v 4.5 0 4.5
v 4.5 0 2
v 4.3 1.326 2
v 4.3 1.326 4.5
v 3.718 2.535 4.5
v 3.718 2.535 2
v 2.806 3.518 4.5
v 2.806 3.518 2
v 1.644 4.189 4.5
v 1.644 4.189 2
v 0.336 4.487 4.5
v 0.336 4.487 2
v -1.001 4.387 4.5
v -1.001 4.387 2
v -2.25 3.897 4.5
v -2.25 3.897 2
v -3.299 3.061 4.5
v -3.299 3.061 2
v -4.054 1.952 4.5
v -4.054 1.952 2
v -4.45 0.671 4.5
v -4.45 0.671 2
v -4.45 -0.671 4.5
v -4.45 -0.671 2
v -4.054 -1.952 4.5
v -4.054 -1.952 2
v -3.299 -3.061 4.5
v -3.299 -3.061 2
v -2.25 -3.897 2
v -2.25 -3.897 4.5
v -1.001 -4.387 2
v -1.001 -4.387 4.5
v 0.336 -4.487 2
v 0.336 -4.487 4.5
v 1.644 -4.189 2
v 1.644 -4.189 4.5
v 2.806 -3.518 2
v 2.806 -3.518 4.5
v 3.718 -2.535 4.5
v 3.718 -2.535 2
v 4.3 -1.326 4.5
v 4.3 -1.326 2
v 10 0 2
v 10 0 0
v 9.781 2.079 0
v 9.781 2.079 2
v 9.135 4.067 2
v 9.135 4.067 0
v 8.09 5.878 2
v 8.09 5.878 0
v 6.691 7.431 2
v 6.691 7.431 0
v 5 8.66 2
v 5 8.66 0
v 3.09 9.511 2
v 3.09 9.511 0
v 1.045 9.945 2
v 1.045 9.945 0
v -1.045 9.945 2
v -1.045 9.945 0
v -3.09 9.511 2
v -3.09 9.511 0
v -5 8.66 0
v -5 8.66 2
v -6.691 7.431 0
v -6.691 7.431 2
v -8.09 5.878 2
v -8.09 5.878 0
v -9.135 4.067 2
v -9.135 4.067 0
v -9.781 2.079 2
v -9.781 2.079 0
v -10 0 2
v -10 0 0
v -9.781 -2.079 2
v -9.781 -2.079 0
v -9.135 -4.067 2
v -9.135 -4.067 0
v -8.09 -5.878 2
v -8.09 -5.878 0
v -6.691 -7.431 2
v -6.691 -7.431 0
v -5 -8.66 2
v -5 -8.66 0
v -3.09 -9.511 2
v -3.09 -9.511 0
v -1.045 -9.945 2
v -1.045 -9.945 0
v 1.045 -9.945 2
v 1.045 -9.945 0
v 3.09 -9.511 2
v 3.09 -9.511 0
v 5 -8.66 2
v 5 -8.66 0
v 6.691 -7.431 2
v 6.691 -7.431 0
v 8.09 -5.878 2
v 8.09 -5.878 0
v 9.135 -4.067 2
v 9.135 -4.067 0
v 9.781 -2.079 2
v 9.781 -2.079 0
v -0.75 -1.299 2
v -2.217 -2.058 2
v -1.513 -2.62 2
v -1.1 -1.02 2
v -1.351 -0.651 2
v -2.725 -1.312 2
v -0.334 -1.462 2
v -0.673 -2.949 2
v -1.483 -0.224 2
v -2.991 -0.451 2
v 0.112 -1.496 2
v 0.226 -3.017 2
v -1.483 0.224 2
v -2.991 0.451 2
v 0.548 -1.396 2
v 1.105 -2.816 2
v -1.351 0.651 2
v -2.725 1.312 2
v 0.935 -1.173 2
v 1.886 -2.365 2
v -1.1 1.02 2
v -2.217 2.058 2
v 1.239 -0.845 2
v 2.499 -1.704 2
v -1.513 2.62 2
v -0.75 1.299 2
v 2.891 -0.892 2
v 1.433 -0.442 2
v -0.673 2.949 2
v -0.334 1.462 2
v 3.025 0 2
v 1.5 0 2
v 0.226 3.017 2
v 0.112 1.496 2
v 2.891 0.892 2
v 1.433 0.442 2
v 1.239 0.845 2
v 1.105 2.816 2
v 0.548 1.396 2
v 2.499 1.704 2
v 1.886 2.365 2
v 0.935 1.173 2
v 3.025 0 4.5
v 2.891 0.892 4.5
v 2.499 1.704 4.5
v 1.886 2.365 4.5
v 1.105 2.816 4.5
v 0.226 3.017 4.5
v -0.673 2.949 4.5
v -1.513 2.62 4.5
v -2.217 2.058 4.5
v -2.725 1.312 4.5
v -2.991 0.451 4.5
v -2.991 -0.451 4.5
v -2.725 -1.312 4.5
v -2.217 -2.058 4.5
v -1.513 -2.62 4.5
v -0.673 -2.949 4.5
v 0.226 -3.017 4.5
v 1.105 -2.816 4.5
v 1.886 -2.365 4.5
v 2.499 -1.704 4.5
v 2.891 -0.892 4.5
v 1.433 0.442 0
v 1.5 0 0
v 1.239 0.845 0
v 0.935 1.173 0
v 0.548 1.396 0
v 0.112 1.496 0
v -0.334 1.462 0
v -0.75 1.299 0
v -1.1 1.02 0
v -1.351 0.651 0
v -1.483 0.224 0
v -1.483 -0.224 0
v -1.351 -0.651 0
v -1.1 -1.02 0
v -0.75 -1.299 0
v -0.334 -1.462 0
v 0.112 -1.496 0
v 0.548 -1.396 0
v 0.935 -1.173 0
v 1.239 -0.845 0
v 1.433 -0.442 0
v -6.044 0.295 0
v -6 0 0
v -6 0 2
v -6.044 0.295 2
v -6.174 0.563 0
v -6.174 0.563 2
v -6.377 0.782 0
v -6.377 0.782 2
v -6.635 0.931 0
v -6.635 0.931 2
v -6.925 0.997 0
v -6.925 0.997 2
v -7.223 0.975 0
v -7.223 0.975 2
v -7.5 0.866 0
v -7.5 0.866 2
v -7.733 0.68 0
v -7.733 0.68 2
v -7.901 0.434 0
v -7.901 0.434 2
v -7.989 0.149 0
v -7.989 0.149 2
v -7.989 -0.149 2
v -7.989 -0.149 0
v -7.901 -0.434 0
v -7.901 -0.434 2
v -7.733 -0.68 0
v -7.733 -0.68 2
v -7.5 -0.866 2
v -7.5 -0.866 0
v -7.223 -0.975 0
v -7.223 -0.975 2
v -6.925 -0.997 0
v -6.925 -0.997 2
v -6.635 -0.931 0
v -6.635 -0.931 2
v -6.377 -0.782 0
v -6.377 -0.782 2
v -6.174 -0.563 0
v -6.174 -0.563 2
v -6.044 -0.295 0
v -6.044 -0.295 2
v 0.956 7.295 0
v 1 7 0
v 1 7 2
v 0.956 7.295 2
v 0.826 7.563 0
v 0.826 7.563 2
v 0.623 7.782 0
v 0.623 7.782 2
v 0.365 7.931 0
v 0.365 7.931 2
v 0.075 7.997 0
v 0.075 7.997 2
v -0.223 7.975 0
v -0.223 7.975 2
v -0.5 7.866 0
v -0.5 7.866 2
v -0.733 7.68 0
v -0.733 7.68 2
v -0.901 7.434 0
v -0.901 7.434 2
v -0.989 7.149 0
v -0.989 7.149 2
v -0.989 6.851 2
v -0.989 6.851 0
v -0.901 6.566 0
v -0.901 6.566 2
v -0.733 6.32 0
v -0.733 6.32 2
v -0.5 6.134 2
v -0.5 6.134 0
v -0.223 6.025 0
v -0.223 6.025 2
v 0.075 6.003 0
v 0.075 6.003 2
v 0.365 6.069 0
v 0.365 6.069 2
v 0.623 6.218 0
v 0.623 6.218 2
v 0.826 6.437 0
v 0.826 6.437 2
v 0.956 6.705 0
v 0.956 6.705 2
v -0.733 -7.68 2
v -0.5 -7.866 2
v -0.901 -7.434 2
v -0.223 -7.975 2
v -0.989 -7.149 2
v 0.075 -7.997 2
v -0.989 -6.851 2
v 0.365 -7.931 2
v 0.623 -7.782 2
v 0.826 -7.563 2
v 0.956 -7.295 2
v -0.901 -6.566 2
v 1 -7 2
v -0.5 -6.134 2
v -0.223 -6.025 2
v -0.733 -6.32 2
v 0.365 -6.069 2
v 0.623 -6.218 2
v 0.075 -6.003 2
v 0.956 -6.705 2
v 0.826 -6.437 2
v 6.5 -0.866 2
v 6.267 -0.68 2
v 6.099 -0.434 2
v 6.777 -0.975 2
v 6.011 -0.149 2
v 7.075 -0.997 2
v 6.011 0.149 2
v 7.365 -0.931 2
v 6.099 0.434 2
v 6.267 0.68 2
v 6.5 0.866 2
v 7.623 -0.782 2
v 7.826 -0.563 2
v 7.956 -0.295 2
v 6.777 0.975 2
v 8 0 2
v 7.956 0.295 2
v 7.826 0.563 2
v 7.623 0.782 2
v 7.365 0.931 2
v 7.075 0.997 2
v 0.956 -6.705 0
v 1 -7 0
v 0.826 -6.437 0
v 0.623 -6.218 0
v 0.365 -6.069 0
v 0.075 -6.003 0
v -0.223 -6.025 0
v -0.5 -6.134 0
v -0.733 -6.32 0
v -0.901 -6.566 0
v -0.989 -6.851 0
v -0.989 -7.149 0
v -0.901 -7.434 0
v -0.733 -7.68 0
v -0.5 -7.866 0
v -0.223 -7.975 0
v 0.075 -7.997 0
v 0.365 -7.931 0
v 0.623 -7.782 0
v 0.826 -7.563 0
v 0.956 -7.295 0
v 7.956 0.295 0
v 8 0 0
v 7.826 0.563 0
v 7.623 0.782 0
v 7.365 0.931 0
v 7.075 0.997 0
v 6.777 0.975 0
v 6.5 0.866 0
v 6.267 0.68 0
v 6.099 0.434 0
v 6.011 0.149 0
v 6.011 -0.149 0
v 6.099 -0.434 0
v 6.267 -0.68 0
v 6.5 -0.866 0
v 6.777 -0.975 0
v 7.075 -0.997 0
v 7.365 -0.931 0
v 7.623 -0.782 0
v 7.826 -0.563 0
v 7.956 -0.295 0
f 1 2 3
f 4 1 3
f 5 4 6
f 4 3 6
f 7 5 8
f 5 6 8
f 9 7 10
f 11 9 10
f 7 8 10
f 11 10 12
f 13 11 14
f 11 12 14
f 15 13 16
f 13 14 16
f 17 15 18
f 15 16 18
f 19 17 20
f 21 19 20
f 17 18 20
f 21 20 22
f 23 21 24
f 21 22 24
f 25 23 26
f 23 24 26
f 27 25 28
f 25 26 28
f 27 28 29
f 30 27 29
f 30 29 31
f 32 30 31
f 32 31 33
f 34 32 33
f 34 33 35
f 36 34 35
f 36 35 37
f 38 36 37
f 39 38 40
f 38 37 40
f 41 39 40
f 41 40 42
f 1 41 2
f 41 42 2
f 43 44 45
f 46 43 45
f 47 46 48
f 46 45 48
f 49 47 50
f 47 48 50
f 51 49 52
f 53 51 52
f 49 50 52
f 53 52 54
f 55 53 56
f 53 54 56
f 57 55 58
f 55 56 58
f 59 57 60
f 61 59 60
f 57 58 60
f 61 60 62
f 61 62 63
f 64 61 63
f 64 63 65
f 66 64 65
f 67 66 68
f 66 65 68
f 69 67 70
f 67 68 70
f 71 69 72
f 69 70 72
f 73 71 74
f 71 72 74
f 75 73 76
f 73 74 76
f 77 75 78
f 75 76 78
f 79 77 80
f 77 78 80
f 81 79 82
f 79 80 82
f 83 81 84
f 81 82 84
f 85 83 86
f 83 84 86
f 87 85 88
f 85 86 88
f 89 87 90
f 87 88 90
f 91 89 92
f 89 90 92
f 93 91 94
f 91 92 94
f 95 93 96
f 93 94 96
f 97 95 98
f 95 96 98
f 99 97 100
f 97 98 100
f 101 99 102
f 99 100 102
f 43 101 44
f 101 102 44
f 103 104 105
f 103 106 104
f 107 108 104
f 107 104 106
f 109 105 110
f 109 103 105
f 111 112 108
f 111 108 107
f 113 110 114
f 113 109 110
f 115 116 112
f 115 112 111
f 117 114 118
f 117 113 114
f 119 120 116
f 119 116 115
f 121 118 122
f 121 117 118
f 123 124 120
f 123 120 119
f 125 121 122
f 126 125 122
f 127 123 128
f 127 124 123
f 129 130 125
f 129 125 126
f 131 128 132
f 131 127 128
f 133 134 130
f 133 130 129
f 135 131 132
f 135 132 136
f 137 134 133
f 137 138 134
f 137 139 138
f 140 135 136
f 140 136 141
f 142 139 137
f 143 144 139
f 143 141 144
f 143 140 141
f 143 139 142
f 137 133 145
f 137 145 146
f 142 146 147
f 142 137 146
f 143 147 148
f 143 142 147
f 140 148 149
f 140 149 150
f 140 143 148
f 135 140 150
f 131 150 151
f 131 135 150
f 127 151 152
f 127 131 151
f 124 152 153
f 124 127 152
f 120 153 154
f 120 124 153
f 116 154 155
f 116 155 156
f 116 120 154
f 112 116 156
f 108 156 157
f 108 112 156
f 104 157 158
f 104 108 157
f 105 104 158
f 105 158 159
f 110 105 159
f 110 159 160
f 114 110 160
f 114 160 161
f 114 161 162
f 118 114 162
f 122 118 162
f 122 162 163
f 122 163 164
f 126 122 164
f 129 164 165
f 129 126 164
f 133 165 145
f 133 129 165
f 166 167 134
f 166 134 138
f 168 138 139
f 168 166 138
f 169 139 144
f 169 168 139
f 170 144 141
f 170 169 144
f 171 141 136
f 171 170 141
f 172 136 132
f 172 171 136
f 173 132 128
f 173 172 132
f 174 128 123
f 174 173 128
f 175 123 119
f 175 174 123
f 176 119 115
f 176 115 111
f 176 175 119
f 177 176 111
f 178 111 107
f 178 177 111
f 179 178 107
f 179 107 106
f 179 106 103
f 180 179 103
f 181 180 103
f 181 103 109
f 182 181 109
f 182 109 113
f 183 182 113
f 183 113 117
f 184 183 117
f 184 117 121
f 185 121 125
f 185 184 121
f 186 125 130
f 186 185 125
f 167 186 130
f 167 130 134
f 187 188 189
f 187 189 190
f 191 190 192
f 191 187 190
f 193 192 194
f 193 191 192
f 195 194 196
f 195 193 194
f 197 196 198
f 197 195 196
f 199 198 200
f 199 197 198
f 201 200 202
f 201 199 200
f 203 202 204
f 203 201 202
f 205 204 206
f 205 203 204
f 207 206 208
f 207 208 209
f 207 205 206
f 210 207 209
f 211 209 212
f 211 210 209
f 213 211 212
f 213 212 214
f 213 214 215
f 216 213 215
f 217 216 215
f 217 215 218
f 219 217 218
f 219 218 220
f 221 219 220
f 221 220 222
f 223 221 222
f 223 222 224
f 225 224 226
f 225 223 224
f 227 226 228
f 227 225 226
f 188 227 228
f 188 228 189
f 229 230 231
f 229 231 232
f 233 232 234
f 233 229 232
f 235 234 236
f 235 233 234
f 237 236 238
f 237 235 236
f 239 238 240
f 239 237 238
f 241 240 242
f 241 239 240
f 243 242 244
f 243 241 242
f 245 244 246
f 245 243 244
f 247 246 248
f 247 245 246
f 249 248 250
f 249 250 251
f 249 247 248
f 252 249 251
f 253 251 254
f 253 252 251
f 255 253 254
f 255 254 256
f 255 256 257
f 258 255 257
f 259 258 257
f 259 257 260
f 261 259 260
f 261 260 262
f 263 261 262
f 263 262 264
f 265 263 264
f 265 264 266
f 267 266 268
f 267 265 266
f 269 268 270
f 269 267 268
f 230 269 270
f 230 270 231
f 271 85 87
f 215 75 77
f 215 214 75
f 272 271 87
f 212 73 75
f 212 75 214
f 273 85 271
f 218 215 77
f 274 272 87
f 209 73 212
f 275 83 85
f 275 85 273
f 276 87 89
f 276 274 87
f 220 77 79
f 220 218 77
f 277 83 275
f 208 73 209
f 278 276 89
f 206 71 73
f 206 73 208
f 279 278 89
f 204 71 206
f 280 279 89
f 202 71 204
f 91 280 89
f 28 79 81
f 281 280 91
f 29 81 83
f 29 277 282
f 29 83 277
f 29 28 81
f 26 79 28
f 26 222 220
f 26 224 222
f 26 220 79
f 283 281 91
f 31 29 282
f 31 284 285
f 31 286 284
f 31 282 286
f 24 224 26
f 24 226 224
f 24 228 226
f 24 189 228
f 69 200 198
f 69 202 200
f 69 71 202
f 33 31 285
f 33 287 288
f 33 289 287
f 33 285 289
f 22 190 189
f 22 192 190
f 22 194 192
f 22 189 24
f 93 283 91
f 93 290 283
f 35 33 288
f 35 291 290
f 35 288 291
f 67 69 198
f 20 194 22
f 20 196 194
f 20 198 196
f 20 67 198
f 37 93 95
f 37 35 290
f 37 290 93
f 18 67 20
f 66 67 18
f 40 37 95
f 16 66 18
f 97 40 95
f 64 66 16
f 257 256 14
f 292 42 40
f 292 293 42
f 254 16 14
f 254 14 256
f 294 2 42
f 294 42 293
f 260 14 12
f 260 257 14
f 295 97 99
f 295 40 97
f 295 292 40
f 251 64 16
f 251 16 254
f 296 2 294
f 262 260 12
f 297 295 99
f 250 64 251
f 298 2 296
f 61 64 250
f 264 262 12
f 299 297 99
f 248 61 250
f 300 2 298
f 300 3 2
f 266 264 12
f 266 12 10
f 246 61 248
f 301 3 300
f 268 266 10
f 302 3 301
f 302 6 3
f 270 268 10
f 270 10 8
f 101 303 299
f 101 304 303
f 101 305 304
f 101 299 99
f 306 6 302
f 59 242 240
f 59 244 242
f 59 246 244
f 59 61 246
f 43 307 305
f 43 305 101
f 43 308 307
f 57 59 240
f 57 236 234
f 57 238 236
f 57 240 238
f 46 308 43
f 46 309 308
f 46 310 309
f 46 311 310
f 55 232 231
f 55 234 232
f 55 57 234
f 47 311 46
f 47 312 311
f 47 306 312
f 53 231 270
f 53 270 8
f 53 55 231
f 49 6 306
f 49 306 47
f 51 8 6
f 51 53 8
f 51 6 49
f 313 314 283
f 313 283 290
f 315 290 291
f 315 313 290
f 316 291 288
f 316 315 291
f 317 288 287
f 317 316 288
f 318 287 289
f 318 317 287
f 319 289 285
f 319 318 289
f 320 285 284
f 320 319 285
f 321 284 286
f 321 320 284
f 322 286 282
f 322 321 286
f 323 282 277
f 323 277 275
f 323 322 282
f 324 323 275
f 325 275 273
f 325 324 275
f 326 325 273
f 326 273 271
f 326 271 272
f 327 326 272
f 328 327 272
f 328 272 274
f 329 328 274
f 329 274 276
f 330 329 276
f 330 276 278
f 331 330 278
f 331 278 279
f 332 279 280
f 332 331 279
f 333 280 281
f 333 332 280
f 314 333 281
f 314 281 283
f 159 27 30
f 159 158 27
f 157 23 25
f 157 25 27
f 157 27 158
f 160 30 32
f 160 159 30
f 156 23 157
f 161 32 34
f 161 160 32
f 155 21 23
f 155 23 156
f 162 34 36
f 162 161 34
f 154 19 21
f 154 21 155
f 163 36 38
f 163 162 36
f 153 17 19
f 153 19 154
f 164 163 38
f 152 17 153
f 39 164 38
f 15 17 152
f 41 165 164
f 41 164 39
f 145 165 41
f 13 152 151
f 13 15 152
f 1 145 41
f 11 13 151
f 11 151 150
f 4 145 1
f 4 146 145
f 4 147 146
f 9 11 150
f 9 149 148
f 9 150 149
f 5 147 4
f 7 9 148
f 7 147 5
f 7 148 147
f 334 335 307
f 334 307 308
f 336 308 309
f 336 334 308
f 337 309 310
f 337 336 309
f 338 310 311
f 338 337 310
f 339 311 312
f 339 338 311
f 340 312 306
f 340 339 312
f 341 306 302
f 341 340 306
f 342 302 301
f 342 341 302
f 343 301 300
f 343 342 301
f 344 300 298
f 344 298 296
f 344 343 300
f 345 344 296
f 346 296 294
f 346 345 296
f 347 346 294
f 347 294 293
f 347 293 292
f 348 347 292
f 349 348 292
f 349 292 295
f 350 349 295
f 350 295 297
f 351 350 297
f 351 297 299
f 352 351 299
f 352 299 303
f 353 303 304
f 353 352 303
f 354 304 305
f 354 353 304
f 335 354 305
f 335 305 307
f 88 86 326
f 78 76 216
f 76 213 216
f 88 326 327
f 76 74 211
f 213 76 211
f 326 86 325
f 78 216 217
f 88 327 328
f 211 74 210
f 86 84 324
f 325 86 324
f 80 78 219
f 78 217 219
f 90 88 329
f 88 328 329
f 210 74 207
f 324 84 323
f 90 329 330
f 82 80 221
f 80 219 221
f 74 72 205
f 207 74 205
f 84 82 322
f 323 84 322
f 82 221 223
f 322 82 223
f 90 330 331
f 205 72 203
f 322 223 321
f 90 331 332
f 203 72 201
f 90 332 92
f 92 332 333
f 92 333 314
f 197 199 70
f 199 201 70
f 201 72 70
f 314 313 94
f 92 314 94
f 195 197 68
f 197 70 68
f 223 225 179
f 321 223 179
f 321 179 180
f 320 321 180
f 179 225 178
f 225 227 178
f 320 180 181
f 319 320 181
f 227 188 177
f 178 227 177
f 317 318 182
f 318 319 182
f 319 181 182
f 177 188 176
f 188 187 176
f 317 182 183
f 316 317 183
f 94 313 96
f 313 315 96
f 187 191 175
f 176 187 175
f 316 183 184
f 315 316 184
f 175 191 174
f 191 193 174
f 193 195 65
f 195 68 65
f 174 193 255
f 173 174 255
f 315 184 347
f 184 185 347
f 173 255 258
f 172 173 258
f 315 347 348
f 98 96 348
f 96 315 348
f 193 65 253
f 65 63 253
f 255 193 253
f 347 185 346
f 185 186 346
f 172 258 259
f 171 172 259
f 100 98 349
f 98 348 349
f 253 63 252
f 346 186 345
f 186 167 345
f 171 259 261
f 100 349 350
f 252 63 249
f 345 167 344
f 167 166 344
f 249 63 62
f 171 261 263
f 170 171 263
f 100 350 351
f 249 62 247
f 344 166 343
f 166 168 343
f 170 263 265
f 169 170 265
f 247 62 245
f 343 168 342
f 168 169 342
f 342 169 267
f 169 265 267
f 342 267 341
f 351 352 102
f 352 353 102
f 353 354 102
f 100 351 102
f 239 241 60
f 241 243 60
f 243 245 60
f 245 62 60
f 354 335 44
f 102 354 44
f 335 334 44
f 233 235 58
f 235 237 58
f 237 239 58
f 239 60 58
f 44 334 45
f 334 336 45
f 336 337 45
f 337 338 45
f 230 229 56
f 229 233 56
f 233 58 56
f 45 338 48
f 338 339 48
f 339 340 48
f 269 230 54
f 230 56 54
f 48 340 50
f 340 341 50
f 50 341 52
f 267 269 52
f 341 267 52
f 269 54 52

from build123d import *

# Parameters (mm, degrees)
SKETCH1_R           = 10
SKETCH1_R_2         = 1
SKETCH1_R_3         = 1.5
BOSS_EXTRUDE1_DEPTH = 2
SKETCH2_R           = 4.5
SKETCH2_R_2         = 3.025
BOSS_EXTRUDE2_DEPTH = 2.5


with BuildPart() as part:
    # Sketch1 → Boss-Extrude1 (new body)
    with BuildSketch(Plane.XY):
        Circle(SKETCH1_R)
        with Locations((7, 0)):
            Circle(SKETCH1_R_2, mode=Mode.SUBTRACT)
        with Locations((0, 7)):
            Circle(SKETCH1_R_2, mode=Mode.SUBTRACT)
        Circle(SKETCH1_R_3, mode=Mode.SUBTRACT)
        with Locations((0, -7)):
            Circle(SKETCH1_R_2, mode=Mode.SUBTRACT)
        with Locations((-7, 0)):
            Circle(SKETCH1_R_2, mode=Mode.SUBTRACT)
    extrude(amount=BOSS_EXTRUDE1_DEPTH)

    # Sketch2 → Boss-Extrude2 (add)
    with BuildSketch(Plane.XY.offset(2)):
        Circle(SKETCH2_R)
        Circle(SKETCH2_R_2, mode=Mode.SUBTRACT)
    extrude(amount=BOSS_EXTRUDE2_DEPTH)


solid = part.part
